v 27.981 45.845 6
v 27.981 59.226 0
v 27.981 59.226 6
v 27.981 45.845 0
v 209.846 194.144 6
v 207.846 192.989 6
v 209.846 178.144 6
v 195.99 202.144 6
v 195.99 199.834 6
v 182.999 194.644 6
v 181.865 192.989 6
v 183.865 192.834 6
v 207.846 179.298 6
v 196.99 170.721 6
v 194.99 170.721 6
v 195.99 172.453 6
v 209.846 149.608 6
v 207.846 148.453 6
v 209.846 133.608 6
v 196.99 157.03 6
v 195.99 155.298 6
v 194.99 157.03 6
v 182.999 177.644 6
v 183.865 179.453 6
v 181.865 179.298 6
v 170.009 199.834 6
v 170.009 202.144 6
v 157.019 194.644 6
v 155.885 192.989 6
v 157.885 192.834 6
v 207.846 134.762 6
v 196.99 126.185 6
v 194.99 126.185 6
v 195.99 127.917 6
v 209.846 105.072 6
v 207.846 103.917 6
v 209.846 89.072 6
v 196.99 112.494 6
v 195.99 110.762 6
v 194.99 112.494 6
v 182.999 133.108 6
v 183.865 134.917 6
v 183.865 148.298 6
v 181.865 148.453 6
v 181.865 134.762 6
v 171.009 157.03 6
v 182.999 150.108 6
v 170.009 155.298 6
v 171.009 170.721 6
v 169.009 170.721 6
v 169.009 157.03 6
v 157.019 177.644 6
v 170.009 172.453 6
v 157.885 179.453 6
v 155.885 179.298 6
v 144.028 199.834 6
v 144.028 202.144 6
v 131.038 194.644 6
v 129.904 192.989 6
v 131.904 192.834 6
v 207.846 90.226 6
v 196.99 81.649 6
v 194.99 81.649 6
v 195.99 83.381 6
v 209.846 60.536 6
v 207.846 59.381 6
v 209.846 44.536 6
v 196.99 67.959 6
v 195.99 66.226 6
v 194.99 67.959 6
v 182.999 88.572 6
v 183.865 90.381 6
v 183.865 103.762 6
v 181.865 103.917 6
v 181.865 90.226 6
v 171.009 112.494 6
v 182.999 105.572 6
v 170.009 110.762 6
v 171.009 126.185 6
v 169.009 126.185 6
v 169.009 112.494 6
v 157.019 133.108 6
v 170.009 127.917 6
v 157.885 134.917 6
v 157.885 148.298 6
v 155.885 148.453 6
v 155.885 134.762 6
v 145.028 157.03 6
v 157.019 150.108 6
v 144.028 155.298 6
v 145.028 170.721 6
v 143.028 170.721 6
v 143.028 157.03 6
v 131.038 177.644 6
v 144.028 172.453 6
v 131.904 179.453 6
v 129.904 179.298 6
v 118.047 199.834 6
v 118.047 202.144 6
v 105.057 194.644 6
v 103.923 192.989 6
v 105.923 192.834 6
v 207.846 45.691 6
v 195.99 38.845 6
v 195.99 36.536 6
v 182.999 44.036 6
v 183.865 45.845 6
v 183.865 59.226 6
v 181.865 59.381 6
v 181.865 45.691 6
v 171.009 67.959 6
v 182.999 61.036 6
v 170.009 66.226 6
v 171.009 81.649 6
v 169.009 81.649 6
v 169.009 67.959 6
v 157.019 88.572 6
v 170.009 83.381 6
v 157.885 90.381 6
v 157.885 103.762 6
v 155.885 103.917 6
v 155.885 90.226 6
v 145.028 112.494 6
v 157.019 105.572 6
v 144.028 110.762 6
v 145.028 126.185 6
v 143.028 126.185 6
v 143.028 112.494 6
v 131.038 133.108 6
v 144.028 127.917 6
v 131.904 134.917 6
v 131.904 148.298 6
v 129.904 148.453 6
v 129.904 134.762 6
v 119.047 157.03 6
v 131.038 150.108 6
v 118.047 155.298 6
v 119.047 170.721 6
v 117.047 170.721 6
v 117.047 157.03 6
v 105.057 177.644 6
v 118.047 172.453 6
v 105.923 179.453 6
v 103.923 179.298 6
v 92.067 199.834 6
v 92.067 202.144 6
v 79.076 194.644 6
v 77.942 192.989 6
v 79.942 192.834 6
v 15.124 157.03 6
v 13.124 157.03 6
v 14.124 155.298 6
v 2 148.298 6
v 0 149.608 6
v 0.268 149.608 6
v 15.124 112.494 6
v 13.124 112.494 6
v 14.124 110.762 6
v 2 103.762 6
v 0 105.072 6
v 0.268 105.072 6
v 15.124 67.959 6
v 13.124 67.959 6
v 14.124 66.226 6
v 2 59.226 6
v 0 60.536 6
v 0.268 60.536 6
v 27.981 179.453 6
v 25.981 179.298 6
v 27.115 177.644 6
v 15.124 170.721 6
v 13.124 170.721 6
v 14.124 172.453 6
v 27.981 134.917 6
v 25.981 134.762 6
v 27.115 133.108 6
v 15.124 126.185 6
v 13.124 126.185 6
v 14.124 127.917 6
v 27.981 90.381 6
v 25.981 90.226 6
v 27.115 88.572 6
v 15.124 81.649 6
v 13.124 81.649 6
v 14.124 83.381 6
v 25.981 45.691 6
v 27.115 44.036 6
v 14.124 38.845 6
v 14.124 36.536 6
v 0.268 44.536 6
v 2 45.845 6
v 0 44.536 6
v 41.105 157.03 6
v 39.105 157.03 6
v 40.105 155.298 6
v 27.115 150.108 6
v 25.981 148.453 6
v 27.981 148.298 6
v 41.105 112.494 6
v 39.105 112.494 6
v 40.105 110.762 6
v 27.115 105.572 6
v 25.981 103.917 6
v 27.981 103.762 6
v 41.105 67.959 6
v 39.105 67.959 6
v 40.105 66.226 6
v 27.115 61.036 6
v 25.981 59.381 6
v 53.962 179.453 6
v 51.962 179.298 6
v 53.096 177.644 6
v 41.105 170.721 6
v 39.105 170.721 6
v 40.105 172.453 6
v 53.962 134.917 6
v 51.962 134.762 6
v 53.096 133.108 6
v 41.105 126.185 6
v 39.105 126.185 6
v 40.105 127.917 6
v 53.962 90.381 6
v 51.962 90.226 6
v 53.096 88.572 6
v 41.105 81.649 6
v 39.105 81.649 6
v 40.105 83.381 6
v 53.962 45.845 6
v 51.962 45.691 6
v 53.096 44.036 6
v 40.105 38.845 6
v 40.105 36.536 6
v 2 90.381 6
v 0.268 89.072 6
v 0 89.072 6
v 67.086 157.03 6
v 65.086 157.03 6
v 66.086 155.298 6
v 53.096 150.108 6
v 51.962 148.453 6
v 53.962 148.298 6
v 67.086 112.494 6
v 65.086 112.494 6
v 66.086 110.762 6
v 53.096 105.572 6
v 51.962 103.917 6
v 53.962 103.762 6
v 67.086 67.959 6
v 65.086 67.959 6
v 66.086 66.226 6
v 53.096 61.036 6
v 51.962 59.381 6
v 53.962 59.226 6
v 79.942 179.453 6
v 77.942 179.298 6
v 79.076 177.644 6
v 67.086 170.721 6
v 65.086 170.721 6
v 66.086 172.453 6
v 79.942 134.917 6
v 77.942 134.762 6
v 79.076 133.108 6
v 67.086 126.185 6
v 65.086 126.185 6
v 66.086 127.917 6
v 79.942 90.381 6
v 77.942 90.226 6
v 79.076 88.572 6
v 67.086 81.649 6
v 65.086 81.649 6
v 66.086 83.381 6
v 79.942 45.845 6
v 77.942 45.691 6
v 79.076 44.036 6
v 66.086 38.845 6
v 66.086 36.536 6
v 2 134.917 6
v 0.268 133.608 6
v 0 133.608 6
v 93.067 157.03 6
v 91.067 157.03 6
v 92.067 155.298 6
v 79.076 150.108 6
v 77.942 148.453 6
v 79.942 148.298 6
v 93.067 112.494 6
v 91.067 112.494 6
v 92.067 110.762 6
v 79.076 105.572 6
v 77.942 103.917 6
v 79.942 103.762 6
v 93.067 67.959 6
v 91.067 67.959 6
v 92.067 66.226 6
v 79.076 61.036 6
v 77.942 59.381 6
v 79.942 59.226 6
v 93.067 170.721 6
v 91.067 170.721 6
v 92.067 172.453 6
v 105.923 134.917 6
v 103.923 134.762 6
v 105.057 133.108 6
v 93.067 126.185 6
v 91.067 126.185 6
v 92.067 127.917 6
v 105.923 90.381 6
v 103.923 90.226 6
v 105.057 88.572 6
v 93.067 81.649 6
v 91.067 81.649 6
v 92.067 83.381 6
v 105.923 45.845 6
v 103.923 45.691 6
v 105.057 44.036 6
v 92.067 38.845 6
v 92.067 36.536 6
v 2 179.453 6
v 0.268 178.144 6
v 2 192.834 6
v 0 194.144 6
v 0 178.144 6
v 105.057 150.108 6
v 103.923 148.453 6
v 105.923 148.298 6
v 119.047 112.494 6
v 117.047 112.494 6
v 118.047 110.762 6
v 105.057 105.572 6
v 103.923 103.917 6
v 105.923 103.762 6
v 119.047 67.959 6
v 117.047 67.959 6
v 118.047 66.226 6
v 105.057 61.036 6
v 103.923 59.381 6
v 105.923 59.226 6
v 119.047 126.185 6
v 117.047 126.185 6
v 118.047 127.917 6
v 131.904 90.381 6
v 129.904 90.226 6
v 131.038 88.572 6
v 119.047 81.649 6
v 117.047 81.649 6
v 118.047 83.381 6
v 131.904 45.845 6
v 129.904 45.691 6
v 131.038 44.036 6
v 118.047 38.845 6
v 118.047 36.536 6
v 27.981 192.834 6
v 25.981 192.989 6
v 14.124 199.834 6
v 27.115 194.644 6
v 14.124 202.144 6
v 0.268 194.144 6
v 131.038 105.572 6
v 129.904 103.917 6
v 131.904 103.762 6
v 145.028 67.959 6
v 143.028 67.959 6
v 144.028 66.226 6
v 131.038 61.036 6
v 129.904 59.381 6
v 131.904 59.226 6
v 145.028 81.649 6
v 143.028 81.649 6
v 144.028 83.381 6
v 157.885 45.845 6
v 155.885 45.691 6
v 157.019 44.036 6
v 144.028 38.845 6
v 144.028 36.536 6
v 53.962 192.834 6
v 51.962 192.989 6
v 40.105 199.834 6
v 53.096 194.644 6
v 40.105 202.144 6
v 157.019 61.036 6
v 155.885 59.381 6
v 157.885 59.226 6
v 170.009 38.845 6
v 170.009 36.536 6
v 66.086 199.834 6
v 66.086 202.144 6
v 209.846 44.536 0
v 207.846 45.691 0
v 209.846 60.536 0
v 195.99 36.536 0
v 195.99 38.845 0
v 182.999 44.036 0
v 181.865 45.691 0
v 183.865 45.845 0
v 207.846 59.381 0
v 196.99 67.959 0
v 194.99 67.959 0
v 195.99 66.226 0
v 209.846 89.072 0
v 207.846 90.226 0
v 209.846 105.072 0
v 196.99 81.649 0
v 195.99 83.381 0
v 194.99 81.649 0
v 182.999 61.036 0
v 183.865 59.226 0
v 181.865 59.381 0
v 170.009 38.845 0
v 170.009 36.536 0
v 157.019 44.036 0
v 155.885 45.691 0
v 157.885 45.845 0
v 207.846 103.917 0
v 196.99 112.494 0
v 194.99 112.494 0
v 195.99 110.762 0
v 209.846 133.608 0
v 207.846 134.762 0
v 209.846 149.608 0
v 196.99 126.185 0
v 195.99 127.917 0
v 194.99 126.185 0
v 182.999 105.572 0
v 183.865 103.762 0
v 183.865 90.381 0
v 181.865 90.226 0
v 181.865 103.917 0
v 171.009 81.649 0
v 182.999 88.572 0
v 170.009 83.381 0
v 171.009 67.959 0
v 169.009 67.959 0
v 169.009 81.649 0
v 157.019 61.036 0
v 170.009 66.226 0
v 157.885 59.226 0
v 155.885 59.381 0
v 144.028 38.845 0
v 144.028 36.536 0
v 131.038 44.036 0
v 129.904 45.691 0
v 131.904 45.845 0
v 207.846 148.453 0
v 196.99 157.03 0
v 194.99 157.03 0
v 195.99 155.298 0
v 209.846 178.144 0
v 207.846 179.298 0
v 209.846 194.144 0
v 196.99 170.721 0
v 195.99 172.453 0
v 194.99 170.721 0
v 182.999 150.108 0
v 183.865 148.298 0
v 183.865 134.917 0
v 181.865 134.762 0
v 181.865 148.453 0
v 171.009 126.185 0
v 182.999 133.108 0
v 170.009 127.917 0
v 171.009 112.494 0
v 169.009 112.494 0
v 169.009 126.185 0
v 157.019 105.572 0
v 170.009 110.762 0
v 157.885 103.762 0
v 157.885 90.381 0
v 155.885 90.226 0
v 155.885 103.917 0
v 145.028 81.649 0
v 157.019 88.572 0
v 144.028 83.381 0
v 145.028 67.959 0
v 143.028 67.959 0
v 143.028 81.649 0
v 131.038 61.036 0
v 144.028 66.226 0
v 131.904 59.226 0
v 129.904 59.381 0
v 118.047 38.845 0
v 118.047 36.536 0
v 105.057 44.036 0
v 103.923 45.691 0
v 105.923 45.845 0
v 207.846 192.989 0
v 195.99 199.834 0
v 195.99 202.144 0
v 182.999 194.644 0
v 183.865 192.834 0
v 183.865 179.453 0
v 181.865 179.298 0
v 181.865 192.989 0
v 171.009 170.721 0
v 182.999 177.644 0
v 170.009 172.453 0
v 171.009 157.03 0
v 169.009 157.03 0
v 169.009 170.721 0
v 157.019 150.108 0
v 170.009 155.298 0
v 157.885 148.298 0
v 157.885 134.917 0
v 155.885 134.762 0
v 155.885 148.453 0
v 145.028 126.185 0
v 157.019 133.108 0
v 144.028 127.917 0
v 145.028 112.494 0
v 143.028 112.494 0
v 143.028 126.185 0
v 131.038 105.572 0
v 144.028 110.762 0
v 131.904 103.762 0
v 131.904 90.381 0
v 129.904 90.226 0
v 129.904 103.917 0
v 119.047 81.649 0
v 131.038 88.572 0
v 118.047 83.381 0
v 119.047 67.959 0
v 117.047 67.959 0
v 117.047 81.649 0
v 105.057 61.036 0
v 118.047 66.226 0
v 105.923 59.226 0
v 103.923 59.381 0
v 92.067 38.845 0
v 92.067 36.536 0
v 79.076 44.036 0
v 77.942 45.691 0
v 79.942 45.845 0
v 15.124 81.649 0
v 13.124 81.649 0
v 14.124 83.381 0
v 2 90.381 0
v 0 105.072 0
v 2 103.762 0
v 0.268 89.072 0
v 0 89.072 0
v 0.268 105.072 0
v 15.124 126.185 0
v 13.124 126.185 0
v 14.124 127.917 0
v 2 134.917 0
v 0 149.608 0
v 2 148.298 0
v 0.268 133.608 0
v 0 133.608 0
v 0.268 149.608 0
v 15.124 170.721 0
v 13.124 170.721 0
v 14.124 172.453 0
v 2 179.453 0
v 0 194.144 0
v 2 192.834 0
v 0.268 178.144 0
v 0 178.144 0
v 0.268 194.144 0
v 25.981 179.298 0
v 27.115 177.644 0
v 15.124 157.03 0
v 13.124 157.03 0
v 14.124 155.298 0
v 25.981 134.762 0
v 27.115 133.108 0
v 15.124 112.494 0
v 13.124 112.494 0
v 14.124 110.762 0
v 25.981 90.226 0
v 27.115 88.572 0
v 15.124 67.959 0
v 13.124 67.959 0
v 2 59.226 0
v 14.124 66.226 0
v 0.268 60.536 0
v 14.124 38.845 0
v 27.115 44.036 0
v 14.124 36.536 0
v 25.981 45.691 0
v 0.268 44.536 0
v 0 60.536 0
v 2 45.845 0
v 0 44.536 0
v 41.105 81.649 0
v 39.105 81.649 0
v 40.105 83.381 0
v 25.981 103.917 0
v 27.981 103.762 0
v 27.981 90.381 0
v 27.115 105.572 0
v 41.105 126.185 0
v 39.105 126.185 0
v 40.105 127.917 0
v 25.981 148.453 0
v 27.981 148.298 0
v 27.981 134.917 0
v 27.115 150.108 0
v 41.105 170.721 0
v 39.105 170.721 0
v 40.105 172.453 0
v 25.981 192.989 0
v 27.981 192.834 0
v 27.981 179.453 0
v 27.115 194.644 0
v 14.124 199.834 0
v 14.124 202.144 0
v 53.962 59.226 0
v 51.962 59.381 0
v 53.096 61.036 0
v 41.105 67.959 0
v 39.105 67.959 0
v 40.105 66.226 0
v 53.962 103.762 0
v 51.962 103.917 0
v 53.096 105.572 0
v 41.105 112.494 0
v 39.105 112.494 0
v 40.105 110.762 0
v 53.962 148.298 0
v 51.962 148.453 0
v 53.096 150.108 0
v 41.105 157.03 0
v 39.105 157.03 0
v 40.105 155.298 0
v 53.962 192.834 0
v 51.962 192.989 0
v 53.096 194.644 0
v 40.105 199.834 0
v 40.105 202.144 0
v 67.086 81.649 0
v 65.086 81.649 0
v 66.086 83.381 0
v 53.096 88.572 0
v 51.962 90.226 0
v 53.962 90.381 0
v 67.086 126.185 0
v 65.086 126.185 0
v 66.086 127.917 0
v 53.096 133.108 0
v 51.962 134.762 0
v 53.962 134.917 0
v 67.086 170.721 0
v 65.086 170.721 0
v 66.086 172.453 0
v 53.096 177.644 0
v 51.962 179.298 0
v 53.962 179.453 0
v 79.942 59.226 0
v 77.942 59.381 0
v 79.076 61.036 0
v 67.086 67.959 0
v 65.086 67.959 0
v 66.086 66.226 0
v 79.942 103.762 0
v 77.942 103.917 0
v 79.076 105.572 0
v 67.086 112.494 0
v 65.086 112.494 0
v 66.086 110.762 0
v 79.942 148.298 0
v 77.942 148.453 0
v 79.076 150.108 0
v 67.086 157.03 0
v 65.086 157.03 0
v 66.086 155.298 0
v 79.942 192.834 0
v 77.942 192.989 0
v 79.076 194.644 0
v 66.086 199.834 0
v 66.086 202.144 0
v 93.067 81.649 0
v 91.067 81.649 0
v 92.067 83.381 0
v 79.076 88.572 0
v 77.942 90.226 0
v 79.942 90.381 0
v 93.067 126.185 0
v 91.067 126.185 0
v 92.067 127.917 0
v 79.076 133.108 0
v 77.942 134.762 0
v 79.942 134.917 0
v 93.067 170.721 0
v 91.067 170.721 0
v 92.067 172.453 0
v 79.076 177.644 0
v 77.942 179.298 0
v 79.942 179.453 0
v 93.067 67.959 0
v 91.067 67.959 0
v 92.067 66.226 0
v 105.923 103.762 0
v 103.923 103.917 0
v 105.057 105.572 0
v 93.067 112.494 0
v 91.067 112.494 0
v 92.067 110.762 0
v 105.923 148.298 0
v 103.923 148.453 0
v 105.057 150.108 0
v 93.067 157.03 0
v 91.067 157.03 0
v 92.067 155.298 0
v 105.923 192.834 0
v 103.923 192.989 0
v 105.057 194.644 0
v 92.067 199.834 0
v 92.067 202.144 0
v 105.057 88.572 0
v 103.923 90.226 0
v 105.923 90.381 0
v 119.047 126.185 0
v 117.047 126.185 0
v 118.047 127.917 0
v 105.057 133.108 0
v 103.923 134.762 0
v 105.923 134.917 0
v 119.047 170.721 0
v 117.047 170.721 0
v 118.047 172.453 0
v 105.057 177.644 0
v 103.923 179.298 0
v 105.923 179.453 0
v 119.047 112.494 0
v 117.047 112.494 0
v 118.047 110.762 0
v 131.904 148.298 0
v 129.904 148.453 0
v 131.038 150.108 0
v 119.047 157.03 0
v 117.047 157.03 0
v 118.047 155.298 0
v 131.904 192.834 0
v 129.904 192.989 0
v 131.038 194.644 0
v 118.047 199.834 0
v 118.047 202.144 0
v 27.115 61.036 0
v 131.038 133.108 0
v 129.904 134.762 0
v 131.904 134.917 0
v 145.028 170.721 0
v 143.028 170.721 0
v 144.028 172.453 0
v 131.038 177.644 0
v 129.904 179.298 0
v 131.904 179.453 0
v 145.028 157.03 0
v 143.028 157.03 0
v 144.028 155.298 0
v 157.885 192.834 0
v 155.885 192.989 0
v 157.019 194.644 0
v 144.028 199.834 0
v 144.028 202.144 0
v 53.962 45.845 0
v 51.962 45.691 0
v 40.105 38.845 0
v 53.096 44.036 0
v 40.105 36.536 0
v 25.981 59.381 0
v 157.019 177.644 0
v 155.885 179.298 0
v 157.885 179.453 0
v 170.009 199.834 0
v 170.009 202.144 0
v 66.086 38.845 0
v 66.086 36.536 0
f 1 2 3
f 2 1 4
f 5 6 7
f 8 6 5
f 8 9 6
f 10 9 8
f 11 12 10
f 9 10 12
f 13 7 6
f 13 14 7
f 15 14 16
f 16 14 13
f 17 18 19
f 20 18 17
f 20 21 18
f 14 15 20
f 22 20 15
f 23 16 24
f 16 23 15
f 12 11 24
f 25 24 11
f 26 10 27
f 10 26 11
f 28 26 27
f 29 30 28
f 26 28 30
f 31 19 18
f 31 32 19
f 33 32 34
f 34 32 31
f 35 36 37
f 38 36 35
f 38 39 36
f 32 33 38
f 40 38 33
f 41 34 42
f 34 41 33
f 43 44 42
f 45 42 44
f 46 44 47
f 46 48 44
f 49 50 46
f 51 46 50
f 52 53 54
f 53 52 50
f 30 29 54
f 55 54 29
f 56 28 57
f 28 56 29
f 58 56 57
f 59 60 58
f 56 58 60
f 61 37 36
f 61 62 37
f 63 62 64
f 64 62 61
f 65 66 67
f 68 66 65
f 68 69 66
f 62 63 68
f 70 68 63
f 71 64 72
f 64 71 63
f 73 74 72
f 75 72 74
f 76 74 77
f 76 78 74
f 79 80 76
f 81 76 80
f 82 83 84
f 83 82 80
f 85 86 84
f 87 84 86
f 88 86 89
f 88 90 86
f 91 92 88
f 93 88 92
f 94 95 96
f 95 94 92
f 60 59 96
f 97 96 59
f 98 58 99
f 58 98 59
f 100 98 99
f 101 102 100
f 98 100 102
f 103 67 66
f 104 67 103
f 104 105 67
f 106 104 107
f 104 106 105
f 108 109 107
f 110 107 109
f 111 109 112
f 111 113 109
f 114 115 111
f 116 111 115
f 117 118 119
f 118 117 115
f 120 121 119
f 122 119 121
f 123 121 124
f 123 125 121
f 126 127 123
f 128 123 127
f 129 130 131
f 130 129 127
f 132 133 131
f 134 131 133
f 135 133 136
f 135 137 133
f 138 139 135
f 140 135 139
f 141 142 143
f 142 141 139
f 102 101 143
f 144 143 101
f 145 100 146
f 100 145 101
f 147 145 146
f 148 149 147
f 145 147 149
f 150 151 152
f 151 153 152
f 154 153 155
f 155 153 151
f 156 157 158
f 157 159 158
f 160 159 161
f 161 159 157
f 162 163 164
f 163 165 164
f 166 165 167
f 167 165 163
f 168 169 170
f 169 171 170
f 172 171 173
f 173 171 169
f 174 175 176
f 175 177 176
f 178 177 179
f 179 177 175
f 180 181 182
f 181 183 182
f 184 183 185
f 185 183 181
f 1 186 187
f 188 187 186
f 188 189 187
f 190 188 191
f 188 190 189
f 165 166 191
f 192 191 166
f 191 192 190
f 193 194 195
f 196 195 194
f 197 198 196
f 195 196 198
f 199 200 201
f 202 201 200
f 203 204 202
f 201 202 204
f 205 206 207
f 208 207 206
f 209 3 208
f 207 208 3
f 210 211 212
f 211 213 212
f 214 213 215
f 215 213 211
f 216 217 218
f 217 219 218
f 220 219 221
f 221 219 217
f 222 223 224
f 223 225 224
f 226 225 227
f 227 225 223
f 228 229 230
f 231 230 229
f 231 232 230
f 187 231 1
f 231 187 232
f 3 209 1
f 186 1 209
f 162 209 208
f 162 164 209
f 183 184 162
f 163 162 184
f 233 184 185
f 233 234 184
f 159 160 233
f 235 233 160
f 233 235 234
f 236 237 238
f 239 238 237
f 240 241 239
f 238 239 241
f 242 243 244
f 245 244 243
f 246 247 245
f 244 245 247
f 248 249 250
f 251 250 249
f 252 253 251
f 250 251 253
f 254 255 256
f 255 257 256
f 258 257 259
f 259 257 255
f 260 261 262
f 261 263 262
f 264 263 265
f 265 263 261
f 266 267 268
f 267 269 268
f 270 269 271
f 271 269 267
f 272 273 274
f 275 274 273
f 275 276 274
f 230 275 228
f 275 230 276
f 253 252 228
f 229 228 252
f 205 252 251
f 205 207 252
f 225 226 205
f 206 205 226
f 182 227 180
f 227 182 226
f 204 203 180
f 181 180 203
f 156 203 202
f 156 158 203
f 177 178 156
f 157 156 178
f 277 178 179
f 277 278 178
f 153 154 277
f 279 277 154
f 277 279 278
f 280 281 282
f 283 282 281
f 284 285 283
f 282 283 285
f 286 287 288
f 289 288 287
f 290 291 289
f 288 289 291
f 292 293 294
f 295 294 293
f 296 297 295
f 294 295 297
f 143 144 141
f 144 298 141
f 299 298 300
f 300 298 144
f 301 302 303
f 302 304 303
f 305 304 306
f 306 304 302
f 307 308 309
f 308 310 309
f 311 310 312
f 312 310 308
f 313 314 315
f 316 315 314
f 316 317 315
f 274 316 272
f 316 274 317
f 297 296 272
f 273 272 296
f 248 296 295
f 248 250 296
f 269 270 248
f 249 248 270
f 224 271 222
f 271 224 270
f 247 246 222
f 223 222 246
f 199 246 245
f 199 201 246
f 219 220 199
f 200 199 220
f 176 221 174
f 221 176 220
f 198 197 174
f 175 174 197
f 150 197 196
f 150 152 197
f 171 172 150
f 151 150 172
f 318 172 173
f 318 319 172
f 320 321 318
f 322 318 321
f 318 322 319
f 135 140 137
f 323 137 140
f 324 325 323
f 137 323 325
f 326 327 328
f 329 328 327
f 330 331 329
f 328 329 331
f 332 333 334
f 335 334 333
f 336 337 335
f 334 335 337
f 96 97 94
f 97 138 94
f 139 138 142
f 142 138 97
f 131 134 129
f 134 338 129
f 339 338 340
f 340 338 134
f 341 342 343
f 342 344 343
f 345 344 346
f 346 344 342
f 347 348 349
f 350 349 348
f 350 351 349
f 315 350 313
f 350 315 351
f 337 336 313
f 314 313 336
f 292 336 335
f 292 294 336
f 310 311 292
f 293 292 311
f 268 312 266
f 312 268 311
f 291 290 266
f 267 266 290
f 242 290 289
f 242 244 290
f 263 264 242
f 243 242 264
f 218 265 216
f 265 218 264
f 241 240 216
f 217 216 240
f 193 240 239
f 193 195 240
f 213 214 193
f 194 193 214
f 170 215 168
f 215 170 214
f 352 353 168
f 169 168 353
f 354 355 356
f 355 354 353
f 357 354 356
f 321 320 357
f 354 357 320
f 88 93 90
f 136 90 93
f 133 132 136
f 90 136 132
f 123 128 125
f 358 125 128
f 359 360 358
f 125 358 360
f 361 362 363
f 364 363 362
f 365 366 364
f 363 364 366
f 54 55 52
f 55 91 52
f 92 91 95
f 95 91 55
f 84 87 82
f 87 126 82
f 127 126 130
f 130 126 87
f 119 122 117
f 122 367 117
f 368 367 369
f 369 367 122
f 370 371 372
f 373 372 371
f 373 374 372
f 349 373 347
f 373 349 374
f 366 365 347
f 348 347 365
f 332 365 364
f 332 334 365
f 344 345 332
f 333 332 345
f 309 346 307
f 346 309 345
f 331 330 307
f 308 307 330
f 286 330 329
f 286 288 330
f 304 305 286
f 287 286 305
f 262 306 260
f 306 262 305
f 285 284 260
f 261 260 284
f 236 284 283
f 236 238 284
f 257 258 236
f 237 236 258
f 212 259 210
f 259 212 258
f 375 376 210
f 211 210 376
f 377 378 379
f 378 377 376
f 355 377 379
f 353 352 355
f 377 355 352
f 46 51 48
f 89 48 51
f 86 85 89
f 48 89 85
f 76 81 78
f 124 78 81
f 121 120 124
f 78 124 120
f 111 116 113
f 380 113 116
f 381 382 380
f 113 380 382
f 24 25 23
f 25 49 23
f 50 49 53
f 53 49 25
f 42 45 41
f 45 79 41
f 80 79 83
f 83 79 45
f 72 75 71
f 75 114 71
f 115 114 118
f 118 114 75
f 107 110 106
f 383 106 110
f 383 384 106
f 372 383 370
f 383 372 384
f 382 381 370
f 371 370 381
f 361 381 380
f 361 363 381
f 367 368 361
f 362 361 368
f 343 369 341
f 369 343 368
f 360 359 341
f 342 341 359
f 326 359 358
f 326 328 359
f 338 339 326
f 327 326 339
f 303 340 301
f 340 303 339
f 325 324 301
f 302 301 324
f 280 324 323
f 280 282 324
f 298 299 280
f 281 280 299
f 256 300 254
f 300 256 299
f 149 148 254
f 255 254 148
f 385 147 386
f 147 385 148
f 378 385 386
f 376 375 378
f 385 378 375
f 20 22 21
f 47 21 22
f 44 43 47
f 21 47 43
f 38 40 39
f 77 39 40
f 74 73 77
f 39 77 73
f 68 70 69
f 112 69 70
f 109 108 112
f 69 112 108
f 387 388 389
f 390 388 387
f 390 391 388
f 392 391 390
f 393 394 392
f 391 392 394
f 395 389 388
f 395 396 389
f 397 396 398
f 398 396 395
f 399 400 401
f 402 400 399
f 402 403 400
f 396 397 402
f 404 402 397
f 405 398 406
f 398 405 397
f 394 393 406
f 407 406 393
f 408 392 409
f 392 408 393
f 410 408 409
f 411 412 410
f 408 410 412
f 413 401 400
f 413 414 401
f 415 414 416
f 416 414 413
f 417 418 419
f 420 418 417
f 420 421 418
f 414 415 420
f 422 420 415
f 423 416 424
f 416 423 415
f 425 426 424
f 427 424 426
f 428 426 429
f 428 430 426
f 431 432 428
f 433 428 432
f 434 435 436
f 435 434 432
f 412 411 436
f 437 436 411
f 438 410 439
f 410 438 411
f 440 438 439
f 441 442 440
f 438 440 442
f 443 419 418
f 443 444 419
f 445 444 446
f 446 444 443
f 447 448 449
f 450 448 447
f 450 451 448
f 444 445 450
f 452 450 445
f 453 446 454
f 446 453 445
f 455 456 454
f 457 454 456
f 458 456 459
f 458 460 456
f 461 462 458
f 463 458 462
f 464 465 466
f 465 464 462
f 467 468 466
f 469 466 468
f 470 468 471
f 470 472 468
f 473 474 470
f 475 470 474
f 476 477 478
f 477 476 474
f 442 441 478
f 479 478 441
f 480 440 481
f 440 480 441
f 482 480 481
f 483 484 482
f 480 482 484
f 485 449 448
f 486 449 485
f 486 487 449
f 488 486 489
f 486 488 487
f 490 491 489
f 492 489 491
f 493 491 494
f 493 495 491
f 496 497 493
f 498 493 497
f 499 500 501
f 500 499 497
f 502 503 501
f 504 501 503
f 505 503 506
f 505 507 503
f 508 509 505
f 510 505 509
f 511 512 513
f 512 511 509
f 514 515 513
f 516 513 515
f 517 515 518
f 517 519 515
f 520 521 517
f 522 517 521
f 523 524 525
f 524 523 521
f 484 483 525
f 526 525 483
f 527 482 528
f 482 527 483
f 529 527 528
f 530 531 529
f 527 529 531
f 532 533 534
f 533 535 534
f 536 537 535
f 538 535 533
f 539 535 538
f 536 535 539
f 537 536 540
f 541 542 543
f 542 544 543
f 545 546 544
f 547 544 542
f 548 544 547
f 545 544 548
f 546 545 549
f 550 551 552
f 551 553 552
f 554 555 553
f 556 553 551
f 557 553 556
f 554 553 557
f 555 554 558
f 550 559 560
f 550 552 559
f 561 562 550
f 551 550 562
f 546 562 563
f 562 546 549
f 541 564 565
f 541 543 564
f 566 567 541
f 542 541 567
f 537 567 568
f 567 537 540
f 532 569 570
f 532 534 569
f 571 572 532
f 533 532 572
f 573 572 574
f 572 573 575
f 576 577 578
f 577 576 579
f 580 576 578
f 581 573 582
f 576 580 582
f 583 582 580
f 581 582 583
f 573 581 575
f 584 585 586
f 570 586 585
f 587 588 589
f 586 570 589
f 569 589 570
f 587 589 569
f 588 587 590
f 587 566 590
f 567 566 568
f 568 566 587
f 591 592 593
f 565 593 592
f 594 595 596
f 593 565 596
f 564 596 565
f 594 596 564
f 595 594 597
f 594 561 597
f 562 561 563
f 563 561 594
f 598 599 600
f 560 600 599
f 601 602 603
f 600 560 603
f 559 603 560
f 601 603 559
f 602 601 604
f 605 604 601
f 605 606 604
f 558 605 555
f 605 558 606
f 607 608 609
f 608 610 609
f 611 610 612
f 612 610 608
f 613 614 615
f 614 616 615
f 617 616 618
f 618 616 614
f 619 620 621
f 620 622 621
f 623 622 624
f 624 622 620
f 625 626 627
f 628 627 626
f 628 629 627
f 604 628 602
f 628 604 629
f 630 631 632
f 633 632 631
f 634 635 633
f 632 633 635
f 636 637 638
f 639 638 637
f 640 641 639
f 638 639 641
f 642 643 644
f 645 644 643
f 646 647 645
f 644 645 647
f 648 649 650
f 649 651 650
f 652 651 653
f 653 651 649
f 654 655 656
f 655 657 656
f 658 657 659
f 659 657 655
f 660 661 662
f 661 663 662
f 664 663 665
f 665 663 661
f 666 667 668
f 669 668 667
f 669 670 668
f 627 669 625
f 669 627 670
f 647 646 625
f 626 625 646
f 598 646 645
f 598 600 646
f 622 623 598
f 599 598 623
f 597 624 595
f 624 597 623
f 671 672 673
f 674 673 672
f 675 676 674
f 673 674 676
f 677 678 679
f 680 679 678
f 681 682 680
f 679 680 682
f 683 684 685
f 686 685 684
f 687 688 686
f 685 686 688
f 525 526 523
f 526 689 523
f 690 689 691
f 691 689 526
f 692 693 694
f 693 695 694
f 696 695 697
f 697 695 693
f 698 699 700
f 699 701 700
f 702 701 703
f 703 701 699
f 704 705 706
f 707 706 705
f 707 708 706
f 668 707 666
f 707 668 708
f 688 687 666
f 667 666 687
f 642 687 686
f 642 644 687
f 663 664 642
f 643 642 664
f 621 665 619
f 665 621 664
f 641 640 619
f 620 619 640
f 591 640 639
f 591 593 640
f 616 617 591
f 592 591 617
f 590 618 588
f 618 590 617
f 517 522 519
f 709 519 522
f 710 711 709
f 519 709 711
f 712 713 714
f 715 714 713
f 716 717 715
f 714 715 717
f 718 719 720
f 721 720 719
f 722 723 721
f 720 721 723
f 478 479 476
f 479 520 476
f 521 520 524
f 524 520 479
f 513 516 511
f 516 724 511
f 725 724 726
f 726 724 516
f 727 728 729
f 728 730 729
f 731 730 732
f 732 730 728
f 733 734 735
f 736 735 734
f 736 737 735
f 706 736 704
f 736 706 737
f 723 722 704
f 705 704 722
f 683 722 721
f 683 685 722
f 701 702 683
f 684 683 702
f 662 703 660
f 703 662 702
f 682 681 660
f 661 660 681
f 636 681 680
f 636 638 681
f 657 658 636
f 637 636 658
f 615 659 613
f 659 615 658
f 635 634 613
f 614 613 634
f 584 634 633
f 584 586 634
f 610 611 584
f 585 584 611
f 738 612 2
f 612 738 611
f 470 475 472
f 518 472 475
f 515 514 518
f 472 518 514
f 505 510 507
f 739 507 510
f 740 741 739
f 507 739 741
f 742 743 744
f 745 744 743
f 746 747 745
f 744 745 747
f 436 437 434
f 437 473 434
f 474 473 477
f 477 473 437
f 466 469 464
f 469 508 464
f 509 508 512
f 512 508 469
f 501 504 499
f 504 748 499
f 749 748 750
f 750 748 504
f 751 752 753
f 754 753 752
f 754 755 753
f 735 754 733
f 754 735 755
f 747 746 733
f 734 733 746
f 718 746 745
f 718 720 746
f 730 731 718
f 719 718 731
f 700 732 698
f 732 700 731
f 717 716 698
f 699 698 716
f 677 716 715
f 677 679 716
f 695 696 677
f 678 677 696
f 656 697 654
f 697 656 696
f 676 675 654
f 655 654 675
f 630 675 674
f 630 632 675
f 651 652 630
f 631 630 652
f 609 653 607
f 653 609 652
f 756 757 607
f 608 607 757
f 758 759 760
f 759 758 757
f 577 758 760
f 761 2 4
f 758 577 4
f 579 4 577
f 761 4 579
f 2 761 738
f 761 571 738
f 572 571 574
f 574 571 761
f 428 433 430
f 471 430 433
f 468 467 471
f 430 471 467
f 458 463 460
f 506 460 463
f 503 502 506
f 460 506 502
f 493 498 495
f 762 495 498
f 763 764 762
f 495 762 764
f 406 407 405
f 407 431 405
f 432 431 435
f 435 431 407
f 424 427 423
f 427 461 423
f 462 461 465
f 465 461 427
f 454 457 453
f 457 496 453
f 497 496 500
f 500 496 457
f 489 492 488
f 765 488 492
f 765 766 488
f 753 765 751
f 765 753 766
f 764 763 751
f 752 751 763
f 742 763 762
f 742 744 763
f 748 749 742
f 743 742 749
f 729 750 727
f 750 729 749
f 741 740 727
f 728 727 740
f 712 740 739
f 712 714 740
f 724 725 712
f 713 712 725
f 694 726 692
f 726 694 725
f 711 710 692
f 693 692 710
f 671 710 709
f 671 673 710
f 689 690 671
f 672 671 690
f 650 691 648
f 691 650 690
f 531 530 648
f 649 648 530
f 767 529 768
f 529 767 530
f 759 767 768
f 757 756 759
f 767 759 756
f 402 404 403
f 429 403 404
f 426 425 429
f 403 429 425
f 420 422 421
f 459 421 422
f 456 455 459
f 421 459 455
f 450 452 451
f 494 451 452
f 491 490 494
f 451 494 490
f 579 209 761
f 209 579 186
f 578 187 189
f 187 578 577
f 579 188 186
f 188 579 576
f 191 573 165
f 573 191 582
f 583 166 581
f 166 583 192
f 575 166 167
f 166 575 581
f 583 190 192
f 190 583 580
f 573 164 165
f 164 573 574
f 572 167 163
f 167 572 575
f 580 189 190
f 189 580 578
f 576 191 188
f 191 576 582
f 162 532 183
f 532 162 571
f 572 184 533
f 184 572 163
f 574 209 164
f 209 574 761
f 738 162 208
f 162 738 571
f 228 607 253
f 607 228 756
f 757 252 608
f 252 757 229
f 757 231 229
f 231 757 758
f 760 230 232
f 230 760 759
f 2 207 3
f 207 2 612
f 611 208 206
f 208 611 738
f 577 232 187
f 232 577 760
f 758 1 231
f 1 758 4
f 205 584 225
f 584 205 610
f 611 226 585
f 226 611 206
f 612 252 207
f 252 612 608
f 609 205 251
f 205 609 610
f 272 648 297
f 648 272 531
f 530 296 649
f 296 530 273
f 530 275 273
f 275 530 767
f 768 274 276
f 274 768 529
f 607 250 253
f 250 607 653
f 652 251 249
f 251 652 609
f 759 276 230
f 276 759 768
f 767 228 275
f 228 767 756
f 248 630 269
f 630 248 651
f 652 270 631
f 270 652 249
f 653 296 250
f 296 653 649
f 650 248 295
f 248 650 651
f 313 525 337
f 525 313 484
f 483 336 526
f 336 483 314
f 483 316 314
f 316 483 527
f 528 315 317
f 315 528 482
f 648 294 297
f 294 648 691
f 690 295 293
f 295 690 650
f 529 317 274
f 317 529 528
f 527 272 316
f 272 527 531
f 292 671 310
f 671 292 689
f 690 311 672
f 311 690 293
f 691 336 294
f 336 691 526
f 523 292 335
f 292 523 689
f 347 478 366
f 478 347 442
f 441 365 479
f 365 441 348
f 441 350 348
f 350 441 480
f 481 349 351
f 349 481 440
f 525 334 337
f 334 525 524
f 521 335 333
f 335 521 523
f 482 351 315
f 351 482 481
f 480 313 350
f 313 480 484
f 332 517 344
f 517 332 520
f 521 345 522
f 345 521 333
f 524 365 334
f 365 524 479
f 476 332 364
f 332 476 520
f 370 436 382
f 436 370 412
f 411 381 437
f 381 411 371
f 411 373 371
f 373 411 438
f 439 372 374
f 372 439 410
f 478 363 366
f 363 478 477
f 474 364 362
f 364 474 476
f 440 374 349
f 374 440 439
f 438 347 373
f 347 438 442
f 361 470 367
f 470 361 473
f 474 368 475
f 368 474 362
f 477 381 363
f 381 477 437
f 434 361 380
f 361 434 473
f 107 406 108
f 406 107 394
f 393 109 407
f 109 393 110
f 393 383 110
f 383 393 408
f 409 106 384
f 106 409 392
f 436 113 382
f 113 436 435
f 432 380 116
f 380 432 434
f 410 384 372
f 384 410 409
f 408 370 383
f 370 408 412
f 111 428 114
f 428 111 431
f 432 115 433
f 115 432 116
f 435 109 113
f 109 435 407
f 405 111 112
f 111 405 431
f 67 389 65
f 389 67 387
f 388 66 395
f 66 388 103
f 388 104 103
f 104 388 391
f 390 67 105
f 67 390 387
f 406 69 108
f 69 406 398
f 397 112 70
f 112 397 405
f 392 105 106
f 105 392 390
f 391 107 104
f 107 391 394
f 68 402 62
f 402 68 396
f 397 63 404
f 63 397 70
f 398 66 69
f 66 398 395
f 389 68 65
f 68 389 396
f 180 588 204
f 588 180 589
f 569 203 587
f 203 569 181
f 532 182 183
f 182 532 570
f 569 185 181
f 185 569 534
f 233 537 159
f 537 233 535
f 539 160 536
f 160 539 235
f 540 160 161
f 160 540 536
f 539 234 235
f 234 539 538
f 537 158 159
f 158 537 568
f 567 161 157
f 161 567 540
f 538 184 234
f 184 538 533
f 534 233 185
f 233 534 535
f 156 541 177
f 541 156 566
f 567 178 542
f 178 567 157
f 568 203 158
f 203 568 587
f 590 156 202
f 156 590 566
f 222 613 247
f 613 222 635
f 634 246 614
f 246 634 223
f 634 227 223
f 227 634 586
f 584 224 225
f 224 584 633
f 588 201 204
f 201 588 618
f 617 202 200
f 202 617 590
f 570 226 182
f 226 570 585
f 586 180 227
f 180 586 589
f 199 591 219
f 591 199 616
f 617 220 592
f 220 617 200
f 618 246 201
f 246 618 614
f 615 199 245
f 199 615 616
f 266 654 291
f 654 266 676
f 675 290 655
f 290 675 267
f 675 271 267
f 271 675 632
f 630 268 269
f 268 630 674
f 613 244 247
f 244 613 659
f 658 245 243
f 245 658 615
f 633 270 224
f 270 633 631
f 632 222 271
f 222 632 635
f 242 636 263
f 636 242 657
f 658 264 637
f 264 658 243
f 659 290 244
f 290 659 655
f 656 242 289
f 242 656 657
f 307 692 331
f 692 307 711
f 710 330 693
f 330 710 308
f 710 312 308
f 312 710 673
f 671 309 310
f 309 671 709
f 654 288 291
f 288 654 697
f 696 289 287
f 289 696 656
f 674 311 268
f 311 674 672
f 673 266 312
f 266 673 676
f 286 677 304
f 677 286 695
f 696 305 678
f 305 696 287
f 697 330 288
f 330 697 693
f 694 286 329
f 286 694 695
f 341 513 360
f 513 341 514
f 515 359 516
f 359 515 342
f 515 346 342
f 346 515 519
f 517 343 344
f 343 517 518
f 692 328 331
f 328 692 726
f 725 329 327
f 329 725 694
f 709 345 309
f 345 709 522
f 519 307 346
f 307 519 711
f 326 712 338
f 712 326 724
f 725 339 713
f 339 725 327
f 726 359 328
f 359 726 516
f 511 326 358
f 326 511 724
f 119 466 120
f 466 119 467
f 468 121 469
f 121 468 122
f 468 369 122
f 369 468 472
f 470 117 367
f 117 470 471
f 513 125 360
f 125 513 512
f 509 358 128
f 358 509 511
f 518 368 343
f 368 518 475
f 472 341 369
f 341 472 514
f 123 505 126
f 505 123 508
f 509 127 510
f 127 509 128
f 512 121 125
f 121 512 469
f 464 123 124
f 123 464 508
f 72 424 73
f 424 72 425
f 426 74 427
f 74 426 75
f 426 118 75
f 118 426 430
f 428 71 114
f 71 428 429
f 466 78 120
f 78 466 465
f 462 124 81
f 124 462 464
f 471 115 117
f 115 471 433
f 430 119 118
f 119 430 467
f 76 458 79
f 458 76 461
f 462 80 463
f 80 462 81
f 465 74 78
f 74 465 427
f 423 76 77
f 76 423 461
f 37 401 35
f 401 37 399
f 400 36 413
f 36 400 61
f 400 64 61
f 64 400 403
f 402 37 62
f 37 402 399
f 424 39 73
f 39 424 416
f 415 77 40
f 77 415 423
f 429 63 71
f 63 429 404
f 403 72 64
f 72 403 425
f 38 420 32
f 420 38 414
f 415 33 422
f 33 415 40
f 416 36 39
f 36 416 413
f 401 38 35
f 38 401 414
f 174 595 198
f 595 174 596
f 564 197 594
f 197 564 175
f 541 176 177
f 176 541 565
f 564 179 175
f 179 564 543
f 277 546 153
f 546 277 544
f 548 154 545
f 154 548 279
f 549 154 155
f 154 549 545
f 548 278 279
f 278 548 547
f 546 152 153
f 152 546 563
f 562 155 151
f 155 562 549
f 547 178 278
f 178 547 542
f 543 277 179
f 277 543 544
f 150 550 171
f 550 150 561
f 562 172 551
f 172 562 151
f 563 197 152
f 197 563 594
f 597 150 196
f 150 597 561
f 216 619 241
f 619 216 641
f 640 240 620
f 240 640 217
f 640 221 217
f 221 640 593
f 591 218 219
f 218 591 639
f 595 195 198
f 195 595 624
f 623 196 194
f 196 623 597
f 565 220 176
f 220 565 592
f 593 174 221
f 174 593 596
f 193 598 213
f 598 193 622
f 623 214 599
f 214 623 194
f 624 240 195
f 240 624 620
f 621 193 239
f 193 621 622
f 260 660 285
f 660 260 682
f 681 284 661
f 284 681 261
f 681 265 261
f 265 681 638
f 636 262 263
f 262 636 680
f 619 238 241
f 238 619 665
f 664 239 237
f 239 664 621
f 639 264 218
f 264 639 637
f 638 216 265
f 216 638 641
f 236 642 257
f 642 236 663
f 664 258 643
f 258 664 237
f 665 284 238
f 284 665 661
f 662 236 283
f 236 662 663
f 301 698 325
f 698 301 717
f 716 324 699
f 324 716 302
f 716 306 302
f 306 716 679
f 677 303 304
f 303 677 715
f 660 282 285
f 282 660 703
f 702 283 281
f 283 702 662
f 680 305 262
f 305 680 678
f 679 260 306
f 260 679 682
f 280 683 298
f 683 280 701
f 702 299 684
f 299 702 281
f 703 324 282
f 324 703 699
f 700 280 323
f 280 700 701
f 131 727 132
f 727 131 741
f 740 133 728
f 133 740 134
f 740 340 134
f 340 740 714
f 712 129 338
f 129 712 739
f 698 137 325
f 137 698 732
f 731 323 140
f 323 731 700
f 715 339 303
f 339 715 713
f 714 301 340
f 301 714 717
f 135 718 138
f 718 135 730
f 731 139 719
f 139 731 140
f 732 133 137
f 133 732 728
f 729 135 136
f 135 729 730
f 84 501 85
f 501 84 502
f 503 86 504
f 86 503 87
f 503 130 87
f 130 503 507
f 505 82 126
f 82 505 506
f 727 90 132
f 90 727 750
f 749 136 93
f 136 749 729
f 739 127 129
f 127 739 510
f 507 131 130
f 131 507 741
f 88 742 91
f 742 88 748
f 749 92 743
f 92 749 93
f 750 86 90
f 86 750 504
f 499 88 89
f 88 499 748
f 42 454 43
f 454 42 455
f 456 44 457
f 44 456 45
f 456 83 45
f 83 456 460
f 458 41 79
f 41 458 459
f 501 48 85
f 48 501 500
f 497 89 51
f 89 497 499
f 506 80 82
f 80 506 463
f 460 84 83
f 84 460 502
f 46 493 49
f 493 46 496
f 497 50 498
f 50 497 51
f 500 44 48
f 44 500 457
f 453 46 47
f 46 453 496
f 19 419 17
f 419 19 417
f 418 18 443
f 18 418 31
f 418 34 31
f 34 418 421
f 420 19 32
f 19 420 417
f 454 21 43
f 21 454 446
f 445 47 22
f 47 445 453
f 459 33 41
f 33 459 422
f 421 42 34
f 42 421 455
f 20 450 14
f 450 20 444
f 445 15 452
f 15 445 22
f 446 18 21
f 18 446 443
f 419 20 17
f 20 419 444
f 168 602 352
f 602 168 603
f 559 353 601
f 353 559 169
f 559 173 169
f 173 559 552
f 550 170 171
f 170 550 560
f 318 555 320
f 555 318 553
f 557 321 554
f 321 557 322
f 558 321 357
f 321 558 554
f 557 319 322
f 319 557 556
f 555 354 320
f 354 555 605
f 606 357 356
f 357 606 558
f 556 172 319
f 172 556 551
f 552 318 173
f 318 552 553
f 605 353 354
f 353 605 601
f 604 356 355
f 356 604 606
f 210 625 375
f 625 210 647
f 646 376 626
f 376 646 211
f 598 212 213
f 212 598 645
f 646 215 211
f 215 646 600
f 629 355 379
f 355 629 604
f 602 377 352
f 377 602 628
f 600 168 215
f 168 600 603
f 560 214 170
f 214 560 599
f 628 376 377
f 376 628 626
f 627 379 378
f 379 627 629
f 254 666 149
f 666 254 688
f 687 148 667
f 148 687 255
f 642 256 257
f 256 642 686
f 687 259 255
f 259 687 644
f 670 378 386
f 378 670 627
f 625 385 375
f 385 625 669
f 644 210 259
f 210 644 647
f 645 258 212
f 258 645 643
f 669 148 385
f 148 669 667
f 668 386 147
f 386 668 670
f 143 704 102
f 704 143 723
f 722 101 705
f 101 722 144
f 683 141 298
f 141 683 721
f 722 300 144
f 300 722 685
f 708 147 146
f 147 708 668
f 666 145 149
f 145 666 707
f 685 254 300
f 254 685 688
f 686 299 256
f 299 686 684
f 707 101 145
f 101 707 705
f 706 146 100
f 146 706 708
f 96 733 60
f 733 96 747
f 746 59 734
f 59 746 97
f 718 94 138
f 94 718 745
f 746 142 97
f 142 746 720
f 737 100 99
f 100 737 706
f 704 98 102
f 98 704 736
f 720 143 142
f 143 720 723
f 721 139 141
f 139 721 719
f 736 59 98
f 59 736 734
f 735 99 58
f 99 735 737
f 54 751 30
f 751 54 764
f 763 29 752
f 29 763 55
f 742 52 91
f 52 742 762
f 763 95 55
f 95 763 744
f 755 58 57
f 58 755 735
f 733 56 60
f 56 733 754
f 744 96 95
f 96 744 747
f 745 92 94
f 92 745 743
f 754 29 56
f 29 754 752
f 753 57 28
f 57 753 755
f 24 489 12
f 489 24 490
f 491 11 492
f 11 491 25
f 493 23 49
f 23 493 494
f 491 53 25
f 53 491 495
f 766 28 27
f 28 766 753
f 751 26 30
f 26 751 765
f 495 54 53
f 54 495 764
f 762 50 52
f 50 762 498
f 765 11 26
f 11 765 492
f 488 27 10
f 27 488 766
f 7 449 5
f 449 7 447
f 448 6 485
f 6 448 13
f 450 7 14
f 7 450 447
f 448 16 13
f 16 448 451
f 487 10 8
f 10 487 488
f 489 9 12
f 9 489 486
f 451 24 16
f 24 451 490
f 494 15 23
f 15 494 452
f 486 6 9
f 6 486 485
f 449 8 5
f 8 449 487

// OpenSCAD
module hexmesh(xnum,ynum,partlength,partheight,partwidth){
a=partlength* sin(30);
b=partlength* cos(30);
halfwidth=partwidth/2;
b2= sqrt(pow(partwidth,2) - pow(partwidth/2,2)) ;
xoffset = b*2-b2;
yoffset= (a+partlength-b2)*2;

	module bar(xoffset,yoffset,rot) {
		translate([xoffset,yoffset,0])
		rotate([0,0,rot])
		cube([partwidth,partlength,partheight],center=false);	
		}

	module part(finalY,finalX) {
		bar(0,0,0);

		bar(partwidth,0,120);

		
		if(finalX){
		bar(-xoffset,0,0);
		}
	
		bar(-b+partwidth+halfwidth,a+partlength-b2,120);
		bar(-b+partwidth,-a,60);
			
		if(!finalY){
		bar(-b+halfwidth,a+b,0);
		}
		
		
		bar(halfwidth,partlength-b2,60);

		}
	
	union(){
	
		for ( j = [1 : ynum/2] )
		{
			for ( i = [1 : xnum] )
			{	
			translate([i*xoffset,j*yoffset])	
			part(j==ynum/2 ,i==1);
			}
		}
	}

}
//hexmesh(xnum,ynum,partlength,partheight,partwidth)
hexmesh(8,8,16,6,2);
